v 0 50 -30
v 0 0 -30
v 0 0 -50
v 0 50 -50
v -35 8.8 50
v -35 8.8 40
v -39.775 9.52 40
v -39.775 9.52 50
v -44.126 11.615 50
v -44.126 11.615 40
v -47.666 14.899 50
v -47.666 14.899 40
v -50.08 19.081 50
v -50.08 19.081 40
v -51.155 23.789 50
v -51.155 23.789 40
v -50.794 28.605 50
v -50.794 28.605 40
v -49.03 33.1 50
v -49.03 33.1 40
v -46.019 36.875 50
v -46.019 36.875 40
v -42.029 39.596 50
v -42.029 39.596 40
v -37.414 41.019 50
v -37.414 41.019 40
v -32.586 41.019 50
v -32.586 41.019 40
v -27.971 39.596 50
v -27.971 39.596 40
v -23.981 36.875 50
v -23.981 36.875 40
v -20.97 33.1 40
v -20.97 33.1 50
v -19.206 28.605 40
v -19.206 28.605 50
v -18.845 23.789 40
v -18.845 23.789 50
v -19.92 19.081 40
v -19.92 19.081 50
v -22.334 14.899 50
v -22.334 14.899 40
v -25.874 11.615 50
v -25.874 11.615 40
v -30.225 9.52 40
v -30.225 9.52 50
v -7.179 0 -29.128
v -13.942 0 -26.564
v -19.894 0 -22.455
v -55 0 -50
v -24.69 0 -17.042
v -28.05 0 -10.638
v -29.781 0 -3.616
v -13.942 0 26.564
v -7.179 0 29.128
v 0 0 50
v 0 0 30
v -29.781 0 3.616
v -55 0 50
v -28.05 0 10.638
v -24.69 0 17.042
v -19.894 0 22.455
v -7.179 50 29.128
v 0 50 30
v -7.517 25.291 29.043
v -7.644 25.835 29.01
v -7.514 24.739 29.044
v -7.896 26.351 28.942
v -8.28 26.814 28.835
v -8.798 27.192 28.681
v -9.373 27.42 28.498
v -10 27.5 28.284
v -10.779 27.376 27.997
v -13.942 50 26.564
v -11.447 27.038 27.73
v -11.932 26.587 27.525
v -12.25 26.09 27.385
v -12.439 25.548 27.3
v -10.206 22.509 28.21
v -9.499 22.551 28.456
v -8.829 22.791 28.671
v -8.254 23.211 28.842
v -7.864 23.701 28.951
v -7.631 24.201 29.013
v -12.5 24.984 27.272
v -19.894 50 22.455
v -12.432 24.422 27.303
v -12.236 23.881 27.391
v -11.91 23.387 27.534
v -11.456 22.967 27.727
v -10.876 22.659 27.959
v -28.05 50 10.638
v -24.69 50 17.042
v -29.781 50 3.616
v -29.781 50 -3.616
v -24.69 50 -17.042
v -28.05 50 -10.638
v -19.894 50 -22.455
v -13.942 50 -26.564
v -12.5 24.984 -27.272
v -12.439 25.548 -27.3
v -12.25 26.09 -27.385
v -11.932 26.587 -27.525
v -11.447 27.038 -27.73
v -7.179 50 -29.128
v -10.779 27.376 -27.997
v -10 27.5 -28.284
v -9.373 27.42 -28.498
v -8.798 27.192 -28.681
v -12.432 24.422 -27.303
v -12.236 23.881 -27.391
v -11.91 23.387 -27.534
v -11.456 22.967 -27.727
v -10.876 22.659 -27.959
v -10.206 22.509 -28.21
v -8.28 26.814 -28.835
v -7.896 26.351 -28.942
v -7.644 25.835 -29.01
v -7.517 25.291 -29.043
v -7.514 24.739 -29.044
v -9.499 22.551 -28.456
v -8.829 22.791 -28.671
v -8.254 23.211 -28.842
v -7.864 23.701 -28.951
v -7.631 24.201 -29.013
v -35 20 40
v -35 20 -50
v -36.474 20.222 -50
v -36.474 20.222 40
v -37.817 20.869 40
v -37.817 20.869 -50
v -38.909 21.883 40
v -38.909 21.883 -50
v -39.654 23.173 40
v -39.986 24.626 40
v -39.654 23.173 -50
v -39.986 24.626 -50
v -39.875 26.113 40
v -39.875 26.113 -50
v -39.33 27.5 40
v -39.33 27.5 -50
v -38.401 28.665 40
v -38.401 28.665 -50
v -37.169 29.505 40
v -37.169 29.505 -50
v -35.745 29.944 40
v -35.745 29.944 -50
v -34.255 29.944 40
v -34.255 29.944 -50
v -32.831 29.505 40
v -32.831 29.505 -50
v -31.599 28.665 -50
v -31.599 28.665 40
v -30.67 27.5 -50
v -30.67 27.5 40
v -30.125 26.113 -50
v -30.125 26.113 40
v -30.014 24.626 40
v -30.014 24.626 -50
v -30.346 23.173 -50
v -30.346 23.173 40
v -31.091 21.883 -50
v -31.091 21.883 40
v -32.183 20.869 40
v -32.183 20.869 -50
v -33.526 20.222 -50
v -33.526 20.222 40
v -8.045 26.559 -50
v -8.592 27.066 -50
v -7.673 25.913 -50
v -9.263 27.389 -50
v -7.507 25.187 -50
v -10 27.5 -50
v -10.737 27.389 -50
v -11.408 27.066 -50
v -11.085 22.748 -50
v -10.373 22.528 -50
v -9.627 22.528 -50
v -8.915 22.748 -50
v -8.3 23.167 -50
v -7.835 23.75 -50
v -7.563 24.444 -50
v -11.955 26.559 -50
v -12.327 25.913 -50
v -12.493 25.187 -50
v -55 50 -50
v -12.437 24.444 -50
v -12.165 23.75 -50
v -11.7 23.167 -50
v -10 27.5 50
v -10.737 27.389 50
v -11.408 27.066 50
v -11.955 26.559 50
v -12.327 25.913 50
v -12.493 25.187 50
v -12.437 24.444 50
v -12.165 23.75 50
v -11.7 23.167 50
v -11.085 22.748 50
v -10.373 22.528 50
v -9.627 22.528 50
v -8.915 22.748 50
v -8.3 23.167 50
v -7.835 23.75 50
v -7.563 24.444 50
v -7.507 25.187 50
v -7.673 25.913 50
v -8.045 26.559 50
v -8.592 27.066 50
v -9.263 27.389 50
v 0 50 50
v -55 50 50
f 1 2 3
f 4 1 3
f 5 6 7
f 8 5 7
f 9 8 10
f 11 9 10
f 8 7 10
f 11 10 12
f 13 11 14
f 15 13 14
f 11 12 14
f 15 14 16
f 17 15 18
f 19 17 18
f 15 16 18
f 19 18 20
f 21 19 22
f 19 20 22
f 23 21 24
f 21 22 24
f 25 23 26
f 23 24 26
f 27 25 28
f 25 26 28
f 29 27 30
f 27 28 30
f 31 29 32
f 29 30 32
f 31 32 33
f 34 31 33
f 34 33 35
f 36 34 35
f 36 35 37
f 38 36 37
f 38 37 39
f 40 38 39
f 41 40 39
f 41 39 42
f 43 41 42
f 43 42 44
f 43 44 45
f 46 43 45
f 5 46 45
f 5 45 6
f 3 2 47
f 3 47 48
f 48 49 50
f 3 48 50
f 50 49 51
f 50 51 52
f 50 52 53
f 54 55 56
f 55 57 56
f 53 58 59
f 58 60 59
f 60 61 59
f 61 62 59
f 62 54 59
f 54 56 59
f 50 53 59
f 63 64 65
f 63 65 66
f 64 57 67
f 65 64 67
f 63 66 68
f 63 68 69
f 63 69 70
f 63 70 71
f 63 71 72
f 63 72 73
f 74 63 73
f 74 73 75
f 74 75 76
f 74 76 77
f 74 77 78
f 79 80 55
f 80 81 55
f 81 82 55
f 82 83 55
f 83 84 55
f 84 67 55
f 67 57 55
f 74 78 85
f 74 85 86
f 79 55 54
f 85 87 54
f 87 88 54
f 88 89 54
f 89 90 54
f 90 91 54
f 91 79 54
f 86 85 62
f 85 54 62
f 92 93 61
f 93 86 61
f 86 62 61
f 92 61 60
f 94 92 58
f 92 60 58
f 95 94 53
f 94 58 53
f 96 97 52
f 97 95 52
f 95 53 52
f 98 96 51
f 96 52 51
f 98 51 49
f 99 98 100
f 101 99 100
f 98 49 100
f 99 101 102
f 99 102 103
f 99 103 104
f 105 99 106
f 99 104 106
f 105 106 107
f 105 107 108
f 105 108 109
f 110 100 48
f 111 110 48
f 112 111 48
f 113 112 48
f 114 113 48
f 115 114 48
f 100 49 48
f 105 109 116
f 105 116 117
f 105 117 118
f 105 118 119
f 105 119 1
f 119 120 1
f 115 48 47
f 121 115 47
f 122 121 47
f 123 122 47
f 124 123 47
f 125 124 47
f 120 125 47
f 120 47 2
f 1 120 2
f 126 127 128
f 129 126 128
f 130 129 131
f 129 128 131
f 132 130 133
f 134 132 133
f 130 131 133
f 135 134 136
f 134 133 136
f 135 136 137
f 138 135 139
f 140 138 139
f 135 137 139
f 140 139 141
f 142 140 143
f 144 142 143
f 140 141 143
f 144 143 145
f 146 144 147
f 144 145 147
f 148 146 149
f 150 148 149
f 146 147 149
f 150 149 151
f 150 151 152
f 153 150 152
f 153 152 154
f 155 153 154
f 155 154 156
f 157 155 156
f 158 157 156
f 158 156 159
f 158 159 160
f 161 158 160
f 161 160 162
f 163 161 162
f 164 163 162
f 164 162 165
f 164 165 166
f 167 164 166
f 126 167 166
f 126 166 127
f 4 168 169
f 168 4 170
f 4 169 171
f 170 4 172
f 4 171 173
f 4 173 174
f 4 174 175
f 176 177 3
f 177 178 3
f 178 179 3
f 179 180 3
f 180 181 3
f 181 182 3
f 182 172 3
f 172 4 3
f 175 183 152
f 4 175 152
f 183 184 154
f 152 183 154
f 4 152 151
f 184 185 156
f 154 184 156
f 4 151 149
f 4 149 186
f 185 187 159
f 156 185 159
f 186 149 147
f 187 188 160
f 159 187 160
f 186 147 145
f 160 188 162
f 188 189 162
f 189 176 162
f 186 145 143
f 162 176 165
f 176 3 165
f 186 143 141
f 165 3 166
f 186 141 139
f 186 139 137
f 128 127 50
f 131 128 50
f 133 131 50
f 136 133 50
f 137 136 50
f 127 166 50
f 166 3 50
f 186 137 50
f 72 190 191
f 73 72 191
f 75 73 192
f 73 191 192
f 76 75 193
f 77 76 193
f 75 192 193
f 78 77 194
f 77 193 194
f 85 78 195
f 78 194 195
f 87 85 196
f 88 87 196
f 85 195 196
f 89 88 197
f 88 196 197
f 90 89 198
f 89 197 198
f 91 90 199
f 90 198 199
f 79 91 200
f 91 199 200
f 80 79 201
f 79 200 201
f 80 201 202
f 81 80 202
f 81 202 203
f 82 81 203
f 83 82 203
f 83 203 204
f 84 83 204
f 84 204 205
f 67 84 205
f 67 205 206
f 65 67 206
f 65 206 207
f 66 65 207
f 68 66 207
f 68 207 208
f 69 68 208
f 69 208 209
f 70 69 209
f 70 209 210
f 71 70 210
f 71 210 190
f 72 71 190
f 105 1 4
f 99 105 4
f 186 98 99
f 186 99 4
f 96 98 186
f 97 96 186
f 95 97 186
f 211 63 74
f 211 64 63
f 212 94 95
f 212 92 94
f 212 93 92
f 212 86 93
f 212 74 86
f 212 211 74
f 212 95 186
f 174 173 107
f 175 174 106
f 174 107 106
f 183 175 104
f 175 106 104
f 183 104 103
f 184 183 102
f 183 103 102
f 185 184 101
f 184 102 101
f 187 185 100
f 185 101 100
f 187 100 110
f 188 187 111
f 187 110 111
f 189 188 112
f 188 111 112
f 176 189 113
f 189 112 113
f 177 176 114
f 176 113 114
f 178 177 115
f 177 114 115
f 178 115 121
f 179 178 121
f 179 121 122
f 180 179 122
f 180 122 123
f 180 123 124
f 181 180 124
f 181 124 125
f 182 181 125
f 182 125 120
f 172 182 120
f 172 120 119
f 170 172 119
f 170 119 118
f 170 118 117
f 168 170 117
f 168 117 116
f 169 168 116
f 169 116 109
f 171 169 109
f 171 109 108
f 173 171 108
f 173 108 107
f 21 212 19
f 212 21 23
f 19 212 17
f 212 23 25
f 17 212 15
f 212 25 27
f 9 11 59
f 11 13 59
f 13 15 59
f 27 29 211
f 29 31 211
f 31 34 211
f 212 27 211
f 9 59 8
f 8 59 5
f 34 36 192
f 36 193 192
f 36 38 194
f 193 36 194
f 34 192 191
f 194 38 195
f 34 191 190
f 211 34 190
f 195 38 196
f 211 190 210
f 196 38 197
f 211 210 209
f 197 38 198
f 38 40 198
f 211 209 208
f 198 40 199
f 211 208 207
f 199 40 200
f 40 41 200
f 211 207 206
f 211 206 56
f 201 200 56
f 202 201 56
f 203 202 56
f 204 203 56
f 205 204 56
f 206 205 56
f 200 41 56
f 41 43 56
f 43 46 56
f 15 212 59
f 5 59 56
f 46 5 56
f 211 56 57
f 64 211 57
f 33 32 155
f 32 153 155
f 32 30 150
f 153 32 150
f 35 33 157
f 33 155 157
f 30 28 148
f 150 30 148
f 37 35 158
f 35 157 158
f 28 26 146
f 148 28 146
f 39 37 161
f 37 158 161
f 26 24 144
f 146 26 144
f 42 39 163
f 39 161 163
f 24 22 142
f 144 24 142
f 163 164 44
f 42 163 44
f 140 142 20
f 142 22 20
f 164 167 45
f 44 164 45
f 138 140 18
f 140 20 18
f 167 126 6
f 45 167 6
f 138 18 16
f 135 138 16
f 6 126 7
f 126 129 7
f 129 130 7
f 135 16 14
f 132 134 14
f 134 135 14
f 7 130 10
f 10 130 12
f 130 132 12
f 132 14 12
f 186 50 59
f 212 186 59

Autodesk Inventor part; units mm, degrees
ref_plane "YZ Plane" through (0, 0, 0) normal (1, 0, 0) x (0, 1, 0)
ref_plane "XZ Plane" through (0, 0, 0) normal (0, 1, 0) x (-1, 0, 0)
ref_plane "XY Plane" through (0, 0, 0) normal (0, 0, 1) x (1, 0, 0)
sketch "Sketch1" plane through (0, 0, 0) normal (0, 1, 0) x (-1, 0, 0)
  line L0 (0, -50) -> (55, -50)
  line L1 (55, -50) -> (55, 50)
  line L2 (55, 50) -> (0, 50)
  arc A0 (0, -30) -> (0, 30) centre (0, 0) ccw
  line L3 (0, 50) -> (0, 30)
  line L4 (0, -30) -> (0, -50)
  point P0 (55, 0)
  dimension "d0" = 100
  dimension "d1" = 55
  dimension "d3" = 60
extrude "Extrusion1" add sketch "Sketch1" along normal blind 50
sketch "Sketch2" plane through (-55, 0, 50) normal (0, 0, 1) x (1, 0, 0)
  line L0 (55, 0) -> (55, 50) construction
  line L1 (55, 50) -> (0, 50) construction
  line L2 (55, 0) -> (0, 0) construction
  line L3 (0, 0) -> (0, 50) projected
  point P0 (20, 25)
  point P1 (0, 25)
  dimension "d14" = 20
hole "Hole1" at (-35, 25, 50) direction (0, 0, -1) diameter 10 end through all counterbore diameter 32.4 counterbore depth 10
sketch "Sketch4" plane through (0, 0, -50) normal (0, 0, -1) x (-1, 0, 0)
  line L0 (55, 0) -> (55, 50) projected
  line L1 (0, 0) -> (0, 50) projected
  point P0 (10, 25)
  point P1 (55, 25)
  dimension "d15" = 10
hole "Hole2" at (-10, 25, -50) direction (0, 0, 1) diameter 5 end through all
properties part number "acople_tubo"
